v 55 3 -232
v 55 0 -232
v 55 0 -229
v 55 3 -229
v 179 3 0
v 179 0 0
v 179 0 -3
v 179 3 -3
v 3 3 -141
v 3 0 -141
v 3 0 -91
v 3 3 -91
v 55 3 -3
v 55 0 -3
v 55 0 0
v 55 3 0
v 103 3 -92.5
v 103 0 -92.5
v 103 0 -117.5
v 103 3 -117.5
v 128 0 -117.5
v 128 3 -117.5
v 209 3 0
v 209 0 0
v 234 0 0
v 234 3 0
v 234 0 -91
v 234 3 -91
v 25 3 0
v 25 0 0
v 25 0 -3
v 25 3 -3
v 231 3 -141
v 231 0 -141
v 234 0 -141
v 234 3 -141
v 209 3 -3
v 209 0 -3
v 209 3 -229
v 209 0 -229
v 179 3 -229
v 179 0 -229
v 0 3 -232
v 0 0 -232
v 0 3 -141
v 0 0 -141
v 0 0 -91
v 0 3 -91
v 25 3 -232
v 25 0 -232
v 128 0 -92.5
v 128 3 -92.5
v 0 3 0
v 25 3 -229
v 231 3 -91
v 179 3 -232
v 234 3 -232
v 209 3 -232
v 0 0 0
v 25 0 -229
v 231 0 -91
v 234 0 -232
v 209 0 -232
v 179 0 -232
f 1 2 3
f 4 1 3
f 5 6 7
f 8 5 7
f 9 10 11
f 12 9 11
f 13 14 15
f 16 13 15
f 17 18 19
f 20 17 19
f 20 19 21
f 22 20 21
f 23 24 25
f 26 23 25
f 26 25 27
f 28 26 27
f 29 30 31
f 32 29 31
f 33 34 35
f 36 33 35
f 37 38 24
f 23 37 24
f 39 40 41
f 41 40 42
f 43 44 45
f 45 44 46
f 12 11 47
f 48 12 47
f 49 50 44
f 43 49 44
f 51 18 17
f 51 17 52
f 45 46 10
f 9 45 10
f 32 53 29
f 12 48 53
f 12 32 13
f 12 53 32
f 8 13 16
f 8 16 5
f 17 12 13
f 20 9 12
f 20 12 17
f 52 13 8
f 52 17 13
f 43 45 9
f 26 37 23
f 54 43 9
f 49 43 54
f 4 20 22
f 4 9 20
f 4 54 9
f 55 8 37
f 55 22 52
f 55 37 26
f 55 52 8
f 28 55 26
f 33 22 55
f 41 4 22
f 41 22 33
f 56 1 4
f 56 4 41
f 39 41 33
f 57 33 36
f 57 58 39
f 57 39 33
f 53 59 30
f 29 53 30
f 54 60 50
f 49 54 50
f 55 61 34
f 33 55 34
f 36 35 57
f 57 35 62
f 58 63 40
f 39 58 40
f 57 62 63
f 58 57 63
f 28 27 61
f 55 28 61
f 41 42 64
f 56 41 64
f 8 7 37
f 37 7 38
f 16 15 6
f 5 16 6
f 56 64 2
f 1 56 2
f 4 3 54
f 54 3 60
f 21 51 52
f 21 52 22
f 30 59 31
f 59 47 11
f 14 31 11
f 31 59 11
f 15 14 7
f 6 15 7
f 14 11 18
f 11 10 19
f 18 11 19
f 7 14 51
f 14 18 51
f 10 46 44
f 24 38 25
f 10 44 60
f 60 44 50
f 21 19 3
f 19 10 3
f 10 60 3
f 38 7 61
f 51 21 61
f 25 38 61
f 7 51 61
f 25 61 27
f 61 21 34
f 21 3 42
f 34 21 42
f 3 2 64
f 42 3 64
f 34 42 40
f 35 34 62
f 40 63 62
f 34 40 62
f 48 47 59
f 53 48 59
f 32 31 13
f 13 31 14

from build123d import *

# Parameters (mm, degrees)
ESBO_O1_W                = 25
ESBO_O1_H                = 25
RESSALTO_EXTRUS_O3_DEPTH = 3


with BuildPart() as part:
    # Esboço1 → Ressalto-extrusão3 (new body)
    with BuildSketch(Plane(origin=(0, 0, 0), x_dir=(1, 0, 0), z_dir=(0, 1, 0))):
        Polygon((0, 91), (0, 0), (25, 0), (25, 3), (55, 3), (55, 0), (179, 0), (179, 3), (209, 3), (209, 0), (234, 0), (234, 91), (231, 91), (231, 141), (234, 141), (234, 232), (209, 232), (209, 229), (179, 229), (179, 232), (55, 232), (55, 229), (25, 229), (25, 232), (0, 232), (0, 141), (3, 141), (3, 91), align=None)
        with Locations((115.5, 105)):
            Rectangle(ESBO_O1_W, ESBO_O1_H, mode=Mode.SUBTRACT)
    extrude(amount=RESSALTO_EXTRUS_O3_DEPTH)


solid = part.part
